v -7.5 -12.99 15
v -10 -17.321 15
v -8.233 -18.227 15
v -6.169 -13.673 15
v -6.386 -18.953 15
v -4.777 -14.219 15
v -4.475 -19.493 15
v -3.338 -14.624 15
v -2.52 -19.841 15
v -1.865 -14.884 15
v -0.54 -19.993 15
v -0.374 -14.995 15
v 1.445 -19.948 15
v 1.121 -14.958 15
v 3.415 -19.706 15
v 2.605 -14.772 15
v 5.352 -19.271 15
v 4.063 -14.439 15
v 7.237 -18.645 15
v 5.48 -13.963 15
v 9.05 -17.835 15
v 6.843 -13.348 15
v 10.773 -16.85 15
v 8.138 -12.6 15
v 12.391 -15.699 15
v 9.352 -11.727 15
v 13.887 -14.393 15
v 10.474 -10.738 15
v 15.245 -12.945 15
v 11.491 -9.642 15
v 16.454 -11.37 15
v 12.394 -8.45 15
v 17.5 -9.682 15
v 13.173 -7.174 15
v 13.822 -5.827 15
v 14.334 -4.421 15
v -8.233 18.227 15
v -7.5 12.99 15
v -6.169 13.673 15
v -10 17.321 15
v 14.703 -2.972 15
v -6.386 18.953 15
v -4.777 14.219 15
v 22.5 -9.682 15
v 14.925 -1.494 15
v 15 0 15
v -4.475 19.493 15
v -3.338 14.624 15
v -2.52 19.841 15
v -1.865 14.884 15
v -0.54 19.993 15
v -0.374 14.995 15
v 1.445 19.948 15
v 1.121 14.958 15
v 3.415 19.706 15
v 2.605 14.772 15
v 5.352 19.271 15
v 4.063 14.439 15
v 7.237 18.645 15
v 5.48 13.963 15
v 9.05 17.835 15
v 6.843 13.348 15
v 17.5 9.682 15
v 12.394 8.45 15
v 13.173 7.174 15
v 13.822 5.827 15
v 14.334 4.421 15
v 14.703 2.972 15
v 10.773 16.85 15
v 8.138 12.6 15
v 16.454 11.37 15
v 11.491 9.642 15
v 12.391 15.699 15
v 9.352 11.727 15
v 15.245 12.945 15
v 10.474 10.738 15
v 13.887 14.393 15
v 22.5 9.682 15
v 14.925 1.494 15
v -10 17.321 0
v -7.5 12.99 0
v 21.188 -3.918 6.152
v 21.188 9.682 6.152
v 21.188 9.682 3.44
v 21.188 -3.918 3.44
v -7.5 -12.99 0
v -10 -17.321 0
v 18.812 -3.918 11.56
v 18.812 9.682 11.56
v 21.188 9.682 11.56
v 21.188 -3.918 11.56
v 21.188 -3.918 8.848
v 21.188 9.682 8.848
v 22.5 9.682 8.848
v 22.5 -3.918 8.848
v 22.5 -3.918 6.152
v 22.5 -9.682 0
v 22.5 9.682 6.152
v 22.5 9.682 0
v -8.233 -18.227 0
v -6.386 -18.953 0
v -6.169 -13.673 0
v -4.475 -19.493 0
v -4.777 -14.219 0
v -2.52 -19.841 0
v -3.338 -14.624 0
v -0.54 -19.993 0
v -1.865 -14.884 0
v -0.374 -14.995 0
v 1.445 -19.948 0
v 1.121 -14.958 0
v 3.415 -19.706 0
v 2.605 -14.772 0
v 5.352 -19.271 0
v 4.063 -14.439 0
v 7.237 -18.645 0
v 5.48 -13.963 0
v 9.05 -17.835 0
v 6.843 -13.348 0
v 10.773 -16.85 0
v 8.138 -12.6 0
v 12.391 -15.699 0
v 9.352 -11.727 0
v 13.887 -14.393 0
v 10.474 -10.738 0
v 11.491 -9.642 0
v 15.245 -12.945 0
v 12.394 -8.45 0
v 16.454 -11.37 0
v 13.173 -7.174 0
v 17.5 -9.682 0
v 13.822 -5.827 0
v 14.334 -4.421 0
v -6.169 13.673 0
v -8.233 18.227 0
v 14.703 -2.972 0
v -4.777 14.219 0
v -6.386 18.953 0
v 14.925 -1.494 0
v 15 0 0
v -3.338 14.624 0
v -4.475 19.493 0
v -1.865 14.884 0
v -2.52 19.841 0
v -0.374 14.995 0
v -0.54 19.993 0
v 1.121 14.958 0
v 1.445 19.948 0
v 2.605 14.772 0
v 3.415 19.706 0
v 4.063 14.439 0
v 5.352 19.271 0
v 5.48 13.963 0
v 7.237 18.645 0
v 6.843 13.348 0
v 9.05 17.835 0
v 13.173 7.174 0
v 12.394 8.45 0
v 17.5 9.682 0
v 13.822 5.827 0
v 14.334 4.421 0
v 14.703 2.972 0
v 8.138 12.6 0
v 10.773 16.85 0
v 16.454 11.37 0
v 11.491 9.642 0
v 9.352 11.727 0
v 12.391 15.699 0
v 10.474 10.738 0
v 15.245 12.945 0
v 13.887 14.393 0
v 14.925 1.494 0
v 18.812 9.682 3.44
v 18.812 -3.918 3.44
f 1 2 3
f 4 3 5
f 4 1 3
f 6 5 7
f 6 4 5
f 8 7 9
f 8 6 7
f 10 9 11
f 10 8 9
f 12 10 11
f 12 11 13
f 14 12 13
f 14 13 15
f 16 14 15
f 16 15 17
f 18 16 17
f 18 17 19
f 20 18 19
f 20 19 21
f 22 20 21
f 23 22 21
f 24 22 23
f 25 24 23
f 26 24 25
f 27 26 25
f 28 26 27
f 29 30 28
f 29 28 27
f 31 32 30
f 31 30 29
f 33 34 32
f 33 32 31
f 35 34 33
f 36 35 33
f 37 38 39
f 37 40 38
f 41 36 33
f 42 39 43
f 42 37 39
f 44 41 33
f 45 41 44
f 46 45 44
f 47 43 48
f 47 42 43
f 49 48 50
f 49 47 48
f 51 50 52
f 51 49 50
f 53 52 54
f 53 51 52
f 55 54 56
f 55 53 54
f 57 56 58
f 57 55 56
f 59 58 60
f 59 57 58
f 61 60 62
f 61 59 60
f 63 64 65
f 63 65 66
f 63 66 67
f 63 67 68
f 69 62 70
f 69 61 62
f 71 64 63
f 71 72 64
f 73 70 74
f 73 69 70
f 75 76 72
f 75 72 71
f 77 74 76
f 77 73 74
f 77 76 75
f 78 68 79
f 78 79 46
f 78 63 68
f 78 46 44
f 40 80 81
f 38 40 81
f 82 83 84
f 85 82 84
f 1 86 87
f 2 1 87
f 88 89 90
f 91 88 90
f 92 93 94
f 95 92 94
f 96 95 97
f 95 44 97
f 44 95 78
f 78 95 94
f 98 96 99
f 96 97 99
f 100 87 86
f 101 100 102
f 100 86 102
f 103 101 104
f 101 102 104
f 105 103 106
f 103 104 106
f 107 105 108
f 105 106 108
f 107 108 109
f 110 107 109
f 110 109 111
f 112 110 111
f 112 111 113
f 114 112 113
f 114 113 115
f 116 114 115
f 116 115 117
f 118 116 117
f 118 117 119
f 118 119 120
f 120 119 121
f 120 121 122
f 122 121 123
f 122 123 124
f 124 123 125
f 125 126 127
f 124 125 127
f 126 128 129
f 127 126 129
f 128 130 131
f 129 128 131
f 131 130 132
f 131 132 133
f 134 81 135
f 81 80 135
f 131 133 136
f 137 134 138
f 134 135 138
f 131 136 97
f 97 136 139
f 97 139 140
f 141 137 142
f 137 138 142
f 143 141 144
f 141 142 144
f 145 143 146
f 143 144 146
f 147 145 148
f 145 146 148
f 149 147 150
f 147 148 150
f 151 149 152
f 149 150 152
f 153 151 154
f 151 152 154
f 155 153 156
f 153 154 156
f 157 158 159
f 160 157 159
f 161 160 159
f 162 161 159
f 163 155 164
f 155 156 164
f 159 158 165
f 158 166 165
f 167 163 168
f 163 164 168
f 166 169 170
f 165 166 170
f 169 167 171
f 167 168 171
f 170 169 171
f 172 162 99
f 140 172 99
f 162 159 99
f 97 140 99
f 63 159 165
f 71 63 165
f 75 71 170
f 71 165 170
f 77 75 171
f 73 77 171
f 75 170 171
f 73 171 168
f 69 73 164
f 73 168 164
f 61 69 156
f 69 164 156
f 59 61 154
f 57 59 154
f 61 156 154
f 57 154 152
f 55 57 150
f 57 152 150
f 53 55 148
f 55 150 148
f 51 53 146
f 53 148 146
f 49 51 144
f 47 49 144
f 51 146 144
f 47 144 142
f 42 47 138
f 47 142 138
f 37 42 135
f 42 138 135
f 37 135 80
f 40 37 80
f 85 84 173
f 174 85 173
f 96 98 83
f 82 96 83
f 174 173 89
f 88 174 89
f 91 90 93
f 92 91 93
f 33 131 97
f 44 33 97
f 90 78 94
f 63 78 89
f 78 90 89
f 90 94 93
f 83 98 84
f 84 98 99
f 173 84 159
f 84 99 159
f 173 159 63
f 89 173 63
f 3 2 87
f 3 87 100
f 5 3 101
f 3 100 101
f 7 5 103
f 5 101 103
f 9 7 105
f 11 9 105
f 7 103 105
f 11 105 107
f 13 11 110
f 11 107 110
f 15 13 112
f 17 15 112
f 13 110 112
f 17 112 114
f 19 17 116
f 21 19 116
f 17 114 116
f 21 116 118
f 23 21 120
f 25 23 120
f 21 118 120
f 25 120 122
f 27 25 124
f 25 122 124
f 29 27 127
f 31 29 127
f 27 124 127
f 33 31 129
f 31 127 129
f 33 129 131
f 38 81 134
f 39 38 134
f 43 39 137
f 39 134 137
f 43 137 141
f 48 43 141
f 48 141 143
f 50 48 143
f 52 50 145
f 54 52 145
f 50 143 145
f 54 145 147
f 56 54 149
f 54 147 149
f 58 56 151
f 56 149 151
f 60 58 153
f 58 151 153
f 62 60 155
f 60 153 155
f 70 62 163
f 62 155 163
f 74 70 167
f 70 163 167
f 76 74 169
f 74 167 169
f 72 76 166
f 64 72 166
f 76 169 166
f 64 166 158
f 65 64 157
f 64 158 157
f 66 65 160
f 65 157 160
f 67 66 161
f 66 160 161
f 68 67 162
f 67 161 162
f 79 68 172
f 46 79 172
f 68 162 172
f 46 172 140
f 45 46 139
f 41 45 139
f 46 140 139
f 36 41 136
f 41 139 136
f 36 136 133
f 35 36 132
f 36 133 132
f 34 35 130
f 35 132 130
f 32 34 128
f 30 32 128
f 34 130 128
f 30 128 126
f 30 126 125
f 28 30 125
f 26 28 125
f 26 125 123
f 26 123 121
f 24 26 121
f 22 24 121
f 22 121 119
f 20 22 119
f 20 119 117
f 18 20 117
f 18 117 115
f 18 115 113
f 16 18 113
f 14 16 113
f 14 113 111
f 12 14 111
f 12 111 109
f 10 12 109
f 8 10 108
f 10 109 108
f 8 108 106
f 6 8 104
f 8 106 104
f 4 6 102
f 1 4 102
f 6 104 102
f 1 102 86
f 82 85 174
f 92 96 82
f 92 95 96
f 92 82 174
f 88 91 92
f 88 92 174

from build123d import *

# Parameters (mm, degrees)
F1_DEPTH = 15
F2_W     = 1.381126
F2_H     = 2.695004
F3_DEPTH = 13.6


with BuildPart() as f1:
    # F0 (on Top) → F1 (new body)
    with BuildSketch(Plane.XY):
        with BuildLine():
            ThreePointArc((-7.5, 12.990381), (15, 0), (-7.5, -12.990381))
            Line((-7.5, -12.990381), (-10, -17.320508))
            ThreePointArc((-10, -17.320508), (5.352331, -19.27051), (17.5, -9.682458))
            Line((17.5, -9.682458), (22.5, -9.682458))
            Line((22.5, -9.682458), (22.5, 9.682458))
            Line((22.5, 9.682458), (17.5, 9.682458))
            ThreePointArc((17.5, 9.682458), (5.352331, 19.27051), (-10, 17.320508))
            Line((-10, 17.320508), (-7.5, 12.990381))
        make_face()
    extrude(amount=F1_DEPTH)

    # F2 (on face) → F3 (cut)
    with BuildSketch(Plane(origin=(0, 9.682458, 0), x_dir=(-1, 0, 0), z_dir=(0, 1, 0))):
        Polygon((-22.5, 6.152498), (-21.187555, 6.152498), (-21.187555, 3.439651), (-18.812445, 3.439651), (-18.812445, 11.560349), (-21.187555, 11.560349), (-21.187555, 8.847502), (-22.5, 8.847502), align=None)
        with Locations((-23.190563, 7.5)):
            Rectangle(F2_W, F2_H)
    extrude(amount=-F3_DEPTH, mode=Mode.SUBTRACT)


solid = f1.part
